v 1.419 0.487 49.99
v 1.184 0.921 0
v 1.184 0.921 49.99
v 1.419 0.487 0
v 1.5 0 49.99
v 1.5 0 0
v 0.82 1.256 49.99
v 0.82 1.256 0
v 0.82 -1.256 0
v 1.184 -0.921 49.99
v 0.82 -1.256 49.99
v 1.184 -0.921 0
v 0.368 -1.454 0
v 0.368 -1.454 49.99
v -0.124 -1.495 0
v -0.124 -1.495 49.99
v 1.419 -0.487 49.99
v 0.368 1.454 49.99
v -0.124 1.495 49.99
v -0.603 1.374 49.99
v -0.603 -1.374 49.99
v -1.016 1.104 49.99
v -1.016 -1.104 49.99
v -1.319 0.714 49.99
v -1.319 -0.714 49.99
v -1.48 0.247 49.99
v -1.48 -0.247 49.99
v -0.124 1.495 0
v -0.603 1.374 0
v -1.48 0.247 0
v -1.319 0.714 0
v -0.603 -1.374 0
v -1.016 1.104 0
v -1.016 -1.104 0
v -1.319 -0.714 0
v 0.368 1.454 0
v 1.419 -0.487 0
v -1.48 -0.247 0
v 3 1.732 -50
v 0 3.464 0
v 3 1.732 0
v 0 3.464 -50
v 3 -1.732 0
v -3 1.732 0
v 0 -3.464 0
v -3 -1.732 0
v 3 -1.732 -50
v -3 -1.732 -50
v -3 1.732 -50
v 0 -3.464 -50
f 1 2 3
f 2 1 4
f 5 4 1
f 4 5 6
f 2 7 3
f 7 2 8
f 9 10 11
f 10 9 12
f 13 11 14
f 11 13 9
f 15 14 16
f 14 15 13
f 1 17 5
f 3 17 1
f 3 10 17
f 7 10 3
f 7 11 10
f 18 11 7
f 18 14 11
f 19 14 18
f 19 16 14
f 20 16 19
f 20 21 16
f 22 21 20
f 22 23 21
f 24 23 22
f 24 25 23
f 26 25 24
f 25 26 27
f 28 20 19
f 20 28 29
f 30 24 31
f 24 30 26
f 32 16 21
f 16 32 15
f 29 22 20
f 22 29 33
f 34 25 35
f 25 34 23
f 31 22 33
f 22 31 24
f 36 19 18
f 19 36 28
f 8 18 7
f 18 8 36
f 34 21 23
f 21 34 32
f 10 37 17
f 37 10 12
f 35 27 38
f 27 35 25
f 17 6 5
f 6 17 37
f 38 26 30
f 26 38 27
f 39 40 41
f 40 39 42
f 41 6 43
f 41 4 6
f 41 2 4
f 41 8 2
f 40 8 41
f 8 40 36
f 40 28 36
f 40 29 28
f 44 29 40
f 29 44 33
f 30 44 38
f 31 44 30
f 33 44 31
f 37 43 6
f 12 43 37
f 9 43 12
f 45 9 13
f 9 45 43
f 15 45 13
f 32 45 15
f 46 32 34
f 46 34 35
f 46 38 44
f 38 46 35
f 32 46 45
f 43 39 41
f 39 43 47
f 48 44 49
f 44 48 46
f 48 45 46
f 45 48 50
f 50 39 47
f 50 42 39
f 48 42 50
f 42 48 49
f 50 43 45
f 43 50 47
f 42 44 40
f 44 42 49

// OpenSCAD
module screwHole(screwDiameter, screwHeadDiameter, screwHeadHeight, screwDepth = 50, screwHeadLead = 1) {
    screwRadius = screwDiameter / 2;
    screwHeadRadius = screwHeadDiameter / 2;
    $fa = 0.2;
    $fs = 0.5;
    
    translate([0, 0, -screwHeadHeight - 0.01])
        cylinder(screwHeadHeight, screwRadius, screwHeadRadius);
    translate([0, 0, -0.02])
        cylinder(screwHeadLead, screwHeadRadius, screwHeadRadius);
    translate([0, 0, -screwHeadHeight - screwDepth])
    cylinder(screwDepth, screwRadius, screwRadius);
}

module nutHole(nutDiameterS, screwDiameter, nutDepth = 50, screwDepth = 50) {
    screwRadius = screwDiameter / 2;
    nutRadiusS = nutDiameterS / 2;
    nutRadiusL = nutRadiusS / sqrt(3) * 2;
    
    $fa = 0.2;
    $fs = 0.5;
    
    translate([0, 0, -0.01])
    cylinder(screwDepth, screwRadius, screwRadius);
    
    translate([0, 0, -nutDepth])
    linear_extrude(nutDepth)
    polygon([
        [sin(0) * nutRadiusL, cos(0) * nutRadiusL],
        [sin(60) * nutRadiusL, cos(60) * nutRadiusL],
        [sin(120) * nutRadiusL, cos(120) * nutRadiusL],
        [sin(180) * nutRadiusL, cos(180) * nutRadiusL],
        [sin(240) * nutRadiusL, cos(240) * nutRadiusL],
        [sin(300) * nutRadiusL, cos(300) * nutRadiusL]
    ]);
}

//screwHole(4, 5, 2);
nutHole(6, 3);
